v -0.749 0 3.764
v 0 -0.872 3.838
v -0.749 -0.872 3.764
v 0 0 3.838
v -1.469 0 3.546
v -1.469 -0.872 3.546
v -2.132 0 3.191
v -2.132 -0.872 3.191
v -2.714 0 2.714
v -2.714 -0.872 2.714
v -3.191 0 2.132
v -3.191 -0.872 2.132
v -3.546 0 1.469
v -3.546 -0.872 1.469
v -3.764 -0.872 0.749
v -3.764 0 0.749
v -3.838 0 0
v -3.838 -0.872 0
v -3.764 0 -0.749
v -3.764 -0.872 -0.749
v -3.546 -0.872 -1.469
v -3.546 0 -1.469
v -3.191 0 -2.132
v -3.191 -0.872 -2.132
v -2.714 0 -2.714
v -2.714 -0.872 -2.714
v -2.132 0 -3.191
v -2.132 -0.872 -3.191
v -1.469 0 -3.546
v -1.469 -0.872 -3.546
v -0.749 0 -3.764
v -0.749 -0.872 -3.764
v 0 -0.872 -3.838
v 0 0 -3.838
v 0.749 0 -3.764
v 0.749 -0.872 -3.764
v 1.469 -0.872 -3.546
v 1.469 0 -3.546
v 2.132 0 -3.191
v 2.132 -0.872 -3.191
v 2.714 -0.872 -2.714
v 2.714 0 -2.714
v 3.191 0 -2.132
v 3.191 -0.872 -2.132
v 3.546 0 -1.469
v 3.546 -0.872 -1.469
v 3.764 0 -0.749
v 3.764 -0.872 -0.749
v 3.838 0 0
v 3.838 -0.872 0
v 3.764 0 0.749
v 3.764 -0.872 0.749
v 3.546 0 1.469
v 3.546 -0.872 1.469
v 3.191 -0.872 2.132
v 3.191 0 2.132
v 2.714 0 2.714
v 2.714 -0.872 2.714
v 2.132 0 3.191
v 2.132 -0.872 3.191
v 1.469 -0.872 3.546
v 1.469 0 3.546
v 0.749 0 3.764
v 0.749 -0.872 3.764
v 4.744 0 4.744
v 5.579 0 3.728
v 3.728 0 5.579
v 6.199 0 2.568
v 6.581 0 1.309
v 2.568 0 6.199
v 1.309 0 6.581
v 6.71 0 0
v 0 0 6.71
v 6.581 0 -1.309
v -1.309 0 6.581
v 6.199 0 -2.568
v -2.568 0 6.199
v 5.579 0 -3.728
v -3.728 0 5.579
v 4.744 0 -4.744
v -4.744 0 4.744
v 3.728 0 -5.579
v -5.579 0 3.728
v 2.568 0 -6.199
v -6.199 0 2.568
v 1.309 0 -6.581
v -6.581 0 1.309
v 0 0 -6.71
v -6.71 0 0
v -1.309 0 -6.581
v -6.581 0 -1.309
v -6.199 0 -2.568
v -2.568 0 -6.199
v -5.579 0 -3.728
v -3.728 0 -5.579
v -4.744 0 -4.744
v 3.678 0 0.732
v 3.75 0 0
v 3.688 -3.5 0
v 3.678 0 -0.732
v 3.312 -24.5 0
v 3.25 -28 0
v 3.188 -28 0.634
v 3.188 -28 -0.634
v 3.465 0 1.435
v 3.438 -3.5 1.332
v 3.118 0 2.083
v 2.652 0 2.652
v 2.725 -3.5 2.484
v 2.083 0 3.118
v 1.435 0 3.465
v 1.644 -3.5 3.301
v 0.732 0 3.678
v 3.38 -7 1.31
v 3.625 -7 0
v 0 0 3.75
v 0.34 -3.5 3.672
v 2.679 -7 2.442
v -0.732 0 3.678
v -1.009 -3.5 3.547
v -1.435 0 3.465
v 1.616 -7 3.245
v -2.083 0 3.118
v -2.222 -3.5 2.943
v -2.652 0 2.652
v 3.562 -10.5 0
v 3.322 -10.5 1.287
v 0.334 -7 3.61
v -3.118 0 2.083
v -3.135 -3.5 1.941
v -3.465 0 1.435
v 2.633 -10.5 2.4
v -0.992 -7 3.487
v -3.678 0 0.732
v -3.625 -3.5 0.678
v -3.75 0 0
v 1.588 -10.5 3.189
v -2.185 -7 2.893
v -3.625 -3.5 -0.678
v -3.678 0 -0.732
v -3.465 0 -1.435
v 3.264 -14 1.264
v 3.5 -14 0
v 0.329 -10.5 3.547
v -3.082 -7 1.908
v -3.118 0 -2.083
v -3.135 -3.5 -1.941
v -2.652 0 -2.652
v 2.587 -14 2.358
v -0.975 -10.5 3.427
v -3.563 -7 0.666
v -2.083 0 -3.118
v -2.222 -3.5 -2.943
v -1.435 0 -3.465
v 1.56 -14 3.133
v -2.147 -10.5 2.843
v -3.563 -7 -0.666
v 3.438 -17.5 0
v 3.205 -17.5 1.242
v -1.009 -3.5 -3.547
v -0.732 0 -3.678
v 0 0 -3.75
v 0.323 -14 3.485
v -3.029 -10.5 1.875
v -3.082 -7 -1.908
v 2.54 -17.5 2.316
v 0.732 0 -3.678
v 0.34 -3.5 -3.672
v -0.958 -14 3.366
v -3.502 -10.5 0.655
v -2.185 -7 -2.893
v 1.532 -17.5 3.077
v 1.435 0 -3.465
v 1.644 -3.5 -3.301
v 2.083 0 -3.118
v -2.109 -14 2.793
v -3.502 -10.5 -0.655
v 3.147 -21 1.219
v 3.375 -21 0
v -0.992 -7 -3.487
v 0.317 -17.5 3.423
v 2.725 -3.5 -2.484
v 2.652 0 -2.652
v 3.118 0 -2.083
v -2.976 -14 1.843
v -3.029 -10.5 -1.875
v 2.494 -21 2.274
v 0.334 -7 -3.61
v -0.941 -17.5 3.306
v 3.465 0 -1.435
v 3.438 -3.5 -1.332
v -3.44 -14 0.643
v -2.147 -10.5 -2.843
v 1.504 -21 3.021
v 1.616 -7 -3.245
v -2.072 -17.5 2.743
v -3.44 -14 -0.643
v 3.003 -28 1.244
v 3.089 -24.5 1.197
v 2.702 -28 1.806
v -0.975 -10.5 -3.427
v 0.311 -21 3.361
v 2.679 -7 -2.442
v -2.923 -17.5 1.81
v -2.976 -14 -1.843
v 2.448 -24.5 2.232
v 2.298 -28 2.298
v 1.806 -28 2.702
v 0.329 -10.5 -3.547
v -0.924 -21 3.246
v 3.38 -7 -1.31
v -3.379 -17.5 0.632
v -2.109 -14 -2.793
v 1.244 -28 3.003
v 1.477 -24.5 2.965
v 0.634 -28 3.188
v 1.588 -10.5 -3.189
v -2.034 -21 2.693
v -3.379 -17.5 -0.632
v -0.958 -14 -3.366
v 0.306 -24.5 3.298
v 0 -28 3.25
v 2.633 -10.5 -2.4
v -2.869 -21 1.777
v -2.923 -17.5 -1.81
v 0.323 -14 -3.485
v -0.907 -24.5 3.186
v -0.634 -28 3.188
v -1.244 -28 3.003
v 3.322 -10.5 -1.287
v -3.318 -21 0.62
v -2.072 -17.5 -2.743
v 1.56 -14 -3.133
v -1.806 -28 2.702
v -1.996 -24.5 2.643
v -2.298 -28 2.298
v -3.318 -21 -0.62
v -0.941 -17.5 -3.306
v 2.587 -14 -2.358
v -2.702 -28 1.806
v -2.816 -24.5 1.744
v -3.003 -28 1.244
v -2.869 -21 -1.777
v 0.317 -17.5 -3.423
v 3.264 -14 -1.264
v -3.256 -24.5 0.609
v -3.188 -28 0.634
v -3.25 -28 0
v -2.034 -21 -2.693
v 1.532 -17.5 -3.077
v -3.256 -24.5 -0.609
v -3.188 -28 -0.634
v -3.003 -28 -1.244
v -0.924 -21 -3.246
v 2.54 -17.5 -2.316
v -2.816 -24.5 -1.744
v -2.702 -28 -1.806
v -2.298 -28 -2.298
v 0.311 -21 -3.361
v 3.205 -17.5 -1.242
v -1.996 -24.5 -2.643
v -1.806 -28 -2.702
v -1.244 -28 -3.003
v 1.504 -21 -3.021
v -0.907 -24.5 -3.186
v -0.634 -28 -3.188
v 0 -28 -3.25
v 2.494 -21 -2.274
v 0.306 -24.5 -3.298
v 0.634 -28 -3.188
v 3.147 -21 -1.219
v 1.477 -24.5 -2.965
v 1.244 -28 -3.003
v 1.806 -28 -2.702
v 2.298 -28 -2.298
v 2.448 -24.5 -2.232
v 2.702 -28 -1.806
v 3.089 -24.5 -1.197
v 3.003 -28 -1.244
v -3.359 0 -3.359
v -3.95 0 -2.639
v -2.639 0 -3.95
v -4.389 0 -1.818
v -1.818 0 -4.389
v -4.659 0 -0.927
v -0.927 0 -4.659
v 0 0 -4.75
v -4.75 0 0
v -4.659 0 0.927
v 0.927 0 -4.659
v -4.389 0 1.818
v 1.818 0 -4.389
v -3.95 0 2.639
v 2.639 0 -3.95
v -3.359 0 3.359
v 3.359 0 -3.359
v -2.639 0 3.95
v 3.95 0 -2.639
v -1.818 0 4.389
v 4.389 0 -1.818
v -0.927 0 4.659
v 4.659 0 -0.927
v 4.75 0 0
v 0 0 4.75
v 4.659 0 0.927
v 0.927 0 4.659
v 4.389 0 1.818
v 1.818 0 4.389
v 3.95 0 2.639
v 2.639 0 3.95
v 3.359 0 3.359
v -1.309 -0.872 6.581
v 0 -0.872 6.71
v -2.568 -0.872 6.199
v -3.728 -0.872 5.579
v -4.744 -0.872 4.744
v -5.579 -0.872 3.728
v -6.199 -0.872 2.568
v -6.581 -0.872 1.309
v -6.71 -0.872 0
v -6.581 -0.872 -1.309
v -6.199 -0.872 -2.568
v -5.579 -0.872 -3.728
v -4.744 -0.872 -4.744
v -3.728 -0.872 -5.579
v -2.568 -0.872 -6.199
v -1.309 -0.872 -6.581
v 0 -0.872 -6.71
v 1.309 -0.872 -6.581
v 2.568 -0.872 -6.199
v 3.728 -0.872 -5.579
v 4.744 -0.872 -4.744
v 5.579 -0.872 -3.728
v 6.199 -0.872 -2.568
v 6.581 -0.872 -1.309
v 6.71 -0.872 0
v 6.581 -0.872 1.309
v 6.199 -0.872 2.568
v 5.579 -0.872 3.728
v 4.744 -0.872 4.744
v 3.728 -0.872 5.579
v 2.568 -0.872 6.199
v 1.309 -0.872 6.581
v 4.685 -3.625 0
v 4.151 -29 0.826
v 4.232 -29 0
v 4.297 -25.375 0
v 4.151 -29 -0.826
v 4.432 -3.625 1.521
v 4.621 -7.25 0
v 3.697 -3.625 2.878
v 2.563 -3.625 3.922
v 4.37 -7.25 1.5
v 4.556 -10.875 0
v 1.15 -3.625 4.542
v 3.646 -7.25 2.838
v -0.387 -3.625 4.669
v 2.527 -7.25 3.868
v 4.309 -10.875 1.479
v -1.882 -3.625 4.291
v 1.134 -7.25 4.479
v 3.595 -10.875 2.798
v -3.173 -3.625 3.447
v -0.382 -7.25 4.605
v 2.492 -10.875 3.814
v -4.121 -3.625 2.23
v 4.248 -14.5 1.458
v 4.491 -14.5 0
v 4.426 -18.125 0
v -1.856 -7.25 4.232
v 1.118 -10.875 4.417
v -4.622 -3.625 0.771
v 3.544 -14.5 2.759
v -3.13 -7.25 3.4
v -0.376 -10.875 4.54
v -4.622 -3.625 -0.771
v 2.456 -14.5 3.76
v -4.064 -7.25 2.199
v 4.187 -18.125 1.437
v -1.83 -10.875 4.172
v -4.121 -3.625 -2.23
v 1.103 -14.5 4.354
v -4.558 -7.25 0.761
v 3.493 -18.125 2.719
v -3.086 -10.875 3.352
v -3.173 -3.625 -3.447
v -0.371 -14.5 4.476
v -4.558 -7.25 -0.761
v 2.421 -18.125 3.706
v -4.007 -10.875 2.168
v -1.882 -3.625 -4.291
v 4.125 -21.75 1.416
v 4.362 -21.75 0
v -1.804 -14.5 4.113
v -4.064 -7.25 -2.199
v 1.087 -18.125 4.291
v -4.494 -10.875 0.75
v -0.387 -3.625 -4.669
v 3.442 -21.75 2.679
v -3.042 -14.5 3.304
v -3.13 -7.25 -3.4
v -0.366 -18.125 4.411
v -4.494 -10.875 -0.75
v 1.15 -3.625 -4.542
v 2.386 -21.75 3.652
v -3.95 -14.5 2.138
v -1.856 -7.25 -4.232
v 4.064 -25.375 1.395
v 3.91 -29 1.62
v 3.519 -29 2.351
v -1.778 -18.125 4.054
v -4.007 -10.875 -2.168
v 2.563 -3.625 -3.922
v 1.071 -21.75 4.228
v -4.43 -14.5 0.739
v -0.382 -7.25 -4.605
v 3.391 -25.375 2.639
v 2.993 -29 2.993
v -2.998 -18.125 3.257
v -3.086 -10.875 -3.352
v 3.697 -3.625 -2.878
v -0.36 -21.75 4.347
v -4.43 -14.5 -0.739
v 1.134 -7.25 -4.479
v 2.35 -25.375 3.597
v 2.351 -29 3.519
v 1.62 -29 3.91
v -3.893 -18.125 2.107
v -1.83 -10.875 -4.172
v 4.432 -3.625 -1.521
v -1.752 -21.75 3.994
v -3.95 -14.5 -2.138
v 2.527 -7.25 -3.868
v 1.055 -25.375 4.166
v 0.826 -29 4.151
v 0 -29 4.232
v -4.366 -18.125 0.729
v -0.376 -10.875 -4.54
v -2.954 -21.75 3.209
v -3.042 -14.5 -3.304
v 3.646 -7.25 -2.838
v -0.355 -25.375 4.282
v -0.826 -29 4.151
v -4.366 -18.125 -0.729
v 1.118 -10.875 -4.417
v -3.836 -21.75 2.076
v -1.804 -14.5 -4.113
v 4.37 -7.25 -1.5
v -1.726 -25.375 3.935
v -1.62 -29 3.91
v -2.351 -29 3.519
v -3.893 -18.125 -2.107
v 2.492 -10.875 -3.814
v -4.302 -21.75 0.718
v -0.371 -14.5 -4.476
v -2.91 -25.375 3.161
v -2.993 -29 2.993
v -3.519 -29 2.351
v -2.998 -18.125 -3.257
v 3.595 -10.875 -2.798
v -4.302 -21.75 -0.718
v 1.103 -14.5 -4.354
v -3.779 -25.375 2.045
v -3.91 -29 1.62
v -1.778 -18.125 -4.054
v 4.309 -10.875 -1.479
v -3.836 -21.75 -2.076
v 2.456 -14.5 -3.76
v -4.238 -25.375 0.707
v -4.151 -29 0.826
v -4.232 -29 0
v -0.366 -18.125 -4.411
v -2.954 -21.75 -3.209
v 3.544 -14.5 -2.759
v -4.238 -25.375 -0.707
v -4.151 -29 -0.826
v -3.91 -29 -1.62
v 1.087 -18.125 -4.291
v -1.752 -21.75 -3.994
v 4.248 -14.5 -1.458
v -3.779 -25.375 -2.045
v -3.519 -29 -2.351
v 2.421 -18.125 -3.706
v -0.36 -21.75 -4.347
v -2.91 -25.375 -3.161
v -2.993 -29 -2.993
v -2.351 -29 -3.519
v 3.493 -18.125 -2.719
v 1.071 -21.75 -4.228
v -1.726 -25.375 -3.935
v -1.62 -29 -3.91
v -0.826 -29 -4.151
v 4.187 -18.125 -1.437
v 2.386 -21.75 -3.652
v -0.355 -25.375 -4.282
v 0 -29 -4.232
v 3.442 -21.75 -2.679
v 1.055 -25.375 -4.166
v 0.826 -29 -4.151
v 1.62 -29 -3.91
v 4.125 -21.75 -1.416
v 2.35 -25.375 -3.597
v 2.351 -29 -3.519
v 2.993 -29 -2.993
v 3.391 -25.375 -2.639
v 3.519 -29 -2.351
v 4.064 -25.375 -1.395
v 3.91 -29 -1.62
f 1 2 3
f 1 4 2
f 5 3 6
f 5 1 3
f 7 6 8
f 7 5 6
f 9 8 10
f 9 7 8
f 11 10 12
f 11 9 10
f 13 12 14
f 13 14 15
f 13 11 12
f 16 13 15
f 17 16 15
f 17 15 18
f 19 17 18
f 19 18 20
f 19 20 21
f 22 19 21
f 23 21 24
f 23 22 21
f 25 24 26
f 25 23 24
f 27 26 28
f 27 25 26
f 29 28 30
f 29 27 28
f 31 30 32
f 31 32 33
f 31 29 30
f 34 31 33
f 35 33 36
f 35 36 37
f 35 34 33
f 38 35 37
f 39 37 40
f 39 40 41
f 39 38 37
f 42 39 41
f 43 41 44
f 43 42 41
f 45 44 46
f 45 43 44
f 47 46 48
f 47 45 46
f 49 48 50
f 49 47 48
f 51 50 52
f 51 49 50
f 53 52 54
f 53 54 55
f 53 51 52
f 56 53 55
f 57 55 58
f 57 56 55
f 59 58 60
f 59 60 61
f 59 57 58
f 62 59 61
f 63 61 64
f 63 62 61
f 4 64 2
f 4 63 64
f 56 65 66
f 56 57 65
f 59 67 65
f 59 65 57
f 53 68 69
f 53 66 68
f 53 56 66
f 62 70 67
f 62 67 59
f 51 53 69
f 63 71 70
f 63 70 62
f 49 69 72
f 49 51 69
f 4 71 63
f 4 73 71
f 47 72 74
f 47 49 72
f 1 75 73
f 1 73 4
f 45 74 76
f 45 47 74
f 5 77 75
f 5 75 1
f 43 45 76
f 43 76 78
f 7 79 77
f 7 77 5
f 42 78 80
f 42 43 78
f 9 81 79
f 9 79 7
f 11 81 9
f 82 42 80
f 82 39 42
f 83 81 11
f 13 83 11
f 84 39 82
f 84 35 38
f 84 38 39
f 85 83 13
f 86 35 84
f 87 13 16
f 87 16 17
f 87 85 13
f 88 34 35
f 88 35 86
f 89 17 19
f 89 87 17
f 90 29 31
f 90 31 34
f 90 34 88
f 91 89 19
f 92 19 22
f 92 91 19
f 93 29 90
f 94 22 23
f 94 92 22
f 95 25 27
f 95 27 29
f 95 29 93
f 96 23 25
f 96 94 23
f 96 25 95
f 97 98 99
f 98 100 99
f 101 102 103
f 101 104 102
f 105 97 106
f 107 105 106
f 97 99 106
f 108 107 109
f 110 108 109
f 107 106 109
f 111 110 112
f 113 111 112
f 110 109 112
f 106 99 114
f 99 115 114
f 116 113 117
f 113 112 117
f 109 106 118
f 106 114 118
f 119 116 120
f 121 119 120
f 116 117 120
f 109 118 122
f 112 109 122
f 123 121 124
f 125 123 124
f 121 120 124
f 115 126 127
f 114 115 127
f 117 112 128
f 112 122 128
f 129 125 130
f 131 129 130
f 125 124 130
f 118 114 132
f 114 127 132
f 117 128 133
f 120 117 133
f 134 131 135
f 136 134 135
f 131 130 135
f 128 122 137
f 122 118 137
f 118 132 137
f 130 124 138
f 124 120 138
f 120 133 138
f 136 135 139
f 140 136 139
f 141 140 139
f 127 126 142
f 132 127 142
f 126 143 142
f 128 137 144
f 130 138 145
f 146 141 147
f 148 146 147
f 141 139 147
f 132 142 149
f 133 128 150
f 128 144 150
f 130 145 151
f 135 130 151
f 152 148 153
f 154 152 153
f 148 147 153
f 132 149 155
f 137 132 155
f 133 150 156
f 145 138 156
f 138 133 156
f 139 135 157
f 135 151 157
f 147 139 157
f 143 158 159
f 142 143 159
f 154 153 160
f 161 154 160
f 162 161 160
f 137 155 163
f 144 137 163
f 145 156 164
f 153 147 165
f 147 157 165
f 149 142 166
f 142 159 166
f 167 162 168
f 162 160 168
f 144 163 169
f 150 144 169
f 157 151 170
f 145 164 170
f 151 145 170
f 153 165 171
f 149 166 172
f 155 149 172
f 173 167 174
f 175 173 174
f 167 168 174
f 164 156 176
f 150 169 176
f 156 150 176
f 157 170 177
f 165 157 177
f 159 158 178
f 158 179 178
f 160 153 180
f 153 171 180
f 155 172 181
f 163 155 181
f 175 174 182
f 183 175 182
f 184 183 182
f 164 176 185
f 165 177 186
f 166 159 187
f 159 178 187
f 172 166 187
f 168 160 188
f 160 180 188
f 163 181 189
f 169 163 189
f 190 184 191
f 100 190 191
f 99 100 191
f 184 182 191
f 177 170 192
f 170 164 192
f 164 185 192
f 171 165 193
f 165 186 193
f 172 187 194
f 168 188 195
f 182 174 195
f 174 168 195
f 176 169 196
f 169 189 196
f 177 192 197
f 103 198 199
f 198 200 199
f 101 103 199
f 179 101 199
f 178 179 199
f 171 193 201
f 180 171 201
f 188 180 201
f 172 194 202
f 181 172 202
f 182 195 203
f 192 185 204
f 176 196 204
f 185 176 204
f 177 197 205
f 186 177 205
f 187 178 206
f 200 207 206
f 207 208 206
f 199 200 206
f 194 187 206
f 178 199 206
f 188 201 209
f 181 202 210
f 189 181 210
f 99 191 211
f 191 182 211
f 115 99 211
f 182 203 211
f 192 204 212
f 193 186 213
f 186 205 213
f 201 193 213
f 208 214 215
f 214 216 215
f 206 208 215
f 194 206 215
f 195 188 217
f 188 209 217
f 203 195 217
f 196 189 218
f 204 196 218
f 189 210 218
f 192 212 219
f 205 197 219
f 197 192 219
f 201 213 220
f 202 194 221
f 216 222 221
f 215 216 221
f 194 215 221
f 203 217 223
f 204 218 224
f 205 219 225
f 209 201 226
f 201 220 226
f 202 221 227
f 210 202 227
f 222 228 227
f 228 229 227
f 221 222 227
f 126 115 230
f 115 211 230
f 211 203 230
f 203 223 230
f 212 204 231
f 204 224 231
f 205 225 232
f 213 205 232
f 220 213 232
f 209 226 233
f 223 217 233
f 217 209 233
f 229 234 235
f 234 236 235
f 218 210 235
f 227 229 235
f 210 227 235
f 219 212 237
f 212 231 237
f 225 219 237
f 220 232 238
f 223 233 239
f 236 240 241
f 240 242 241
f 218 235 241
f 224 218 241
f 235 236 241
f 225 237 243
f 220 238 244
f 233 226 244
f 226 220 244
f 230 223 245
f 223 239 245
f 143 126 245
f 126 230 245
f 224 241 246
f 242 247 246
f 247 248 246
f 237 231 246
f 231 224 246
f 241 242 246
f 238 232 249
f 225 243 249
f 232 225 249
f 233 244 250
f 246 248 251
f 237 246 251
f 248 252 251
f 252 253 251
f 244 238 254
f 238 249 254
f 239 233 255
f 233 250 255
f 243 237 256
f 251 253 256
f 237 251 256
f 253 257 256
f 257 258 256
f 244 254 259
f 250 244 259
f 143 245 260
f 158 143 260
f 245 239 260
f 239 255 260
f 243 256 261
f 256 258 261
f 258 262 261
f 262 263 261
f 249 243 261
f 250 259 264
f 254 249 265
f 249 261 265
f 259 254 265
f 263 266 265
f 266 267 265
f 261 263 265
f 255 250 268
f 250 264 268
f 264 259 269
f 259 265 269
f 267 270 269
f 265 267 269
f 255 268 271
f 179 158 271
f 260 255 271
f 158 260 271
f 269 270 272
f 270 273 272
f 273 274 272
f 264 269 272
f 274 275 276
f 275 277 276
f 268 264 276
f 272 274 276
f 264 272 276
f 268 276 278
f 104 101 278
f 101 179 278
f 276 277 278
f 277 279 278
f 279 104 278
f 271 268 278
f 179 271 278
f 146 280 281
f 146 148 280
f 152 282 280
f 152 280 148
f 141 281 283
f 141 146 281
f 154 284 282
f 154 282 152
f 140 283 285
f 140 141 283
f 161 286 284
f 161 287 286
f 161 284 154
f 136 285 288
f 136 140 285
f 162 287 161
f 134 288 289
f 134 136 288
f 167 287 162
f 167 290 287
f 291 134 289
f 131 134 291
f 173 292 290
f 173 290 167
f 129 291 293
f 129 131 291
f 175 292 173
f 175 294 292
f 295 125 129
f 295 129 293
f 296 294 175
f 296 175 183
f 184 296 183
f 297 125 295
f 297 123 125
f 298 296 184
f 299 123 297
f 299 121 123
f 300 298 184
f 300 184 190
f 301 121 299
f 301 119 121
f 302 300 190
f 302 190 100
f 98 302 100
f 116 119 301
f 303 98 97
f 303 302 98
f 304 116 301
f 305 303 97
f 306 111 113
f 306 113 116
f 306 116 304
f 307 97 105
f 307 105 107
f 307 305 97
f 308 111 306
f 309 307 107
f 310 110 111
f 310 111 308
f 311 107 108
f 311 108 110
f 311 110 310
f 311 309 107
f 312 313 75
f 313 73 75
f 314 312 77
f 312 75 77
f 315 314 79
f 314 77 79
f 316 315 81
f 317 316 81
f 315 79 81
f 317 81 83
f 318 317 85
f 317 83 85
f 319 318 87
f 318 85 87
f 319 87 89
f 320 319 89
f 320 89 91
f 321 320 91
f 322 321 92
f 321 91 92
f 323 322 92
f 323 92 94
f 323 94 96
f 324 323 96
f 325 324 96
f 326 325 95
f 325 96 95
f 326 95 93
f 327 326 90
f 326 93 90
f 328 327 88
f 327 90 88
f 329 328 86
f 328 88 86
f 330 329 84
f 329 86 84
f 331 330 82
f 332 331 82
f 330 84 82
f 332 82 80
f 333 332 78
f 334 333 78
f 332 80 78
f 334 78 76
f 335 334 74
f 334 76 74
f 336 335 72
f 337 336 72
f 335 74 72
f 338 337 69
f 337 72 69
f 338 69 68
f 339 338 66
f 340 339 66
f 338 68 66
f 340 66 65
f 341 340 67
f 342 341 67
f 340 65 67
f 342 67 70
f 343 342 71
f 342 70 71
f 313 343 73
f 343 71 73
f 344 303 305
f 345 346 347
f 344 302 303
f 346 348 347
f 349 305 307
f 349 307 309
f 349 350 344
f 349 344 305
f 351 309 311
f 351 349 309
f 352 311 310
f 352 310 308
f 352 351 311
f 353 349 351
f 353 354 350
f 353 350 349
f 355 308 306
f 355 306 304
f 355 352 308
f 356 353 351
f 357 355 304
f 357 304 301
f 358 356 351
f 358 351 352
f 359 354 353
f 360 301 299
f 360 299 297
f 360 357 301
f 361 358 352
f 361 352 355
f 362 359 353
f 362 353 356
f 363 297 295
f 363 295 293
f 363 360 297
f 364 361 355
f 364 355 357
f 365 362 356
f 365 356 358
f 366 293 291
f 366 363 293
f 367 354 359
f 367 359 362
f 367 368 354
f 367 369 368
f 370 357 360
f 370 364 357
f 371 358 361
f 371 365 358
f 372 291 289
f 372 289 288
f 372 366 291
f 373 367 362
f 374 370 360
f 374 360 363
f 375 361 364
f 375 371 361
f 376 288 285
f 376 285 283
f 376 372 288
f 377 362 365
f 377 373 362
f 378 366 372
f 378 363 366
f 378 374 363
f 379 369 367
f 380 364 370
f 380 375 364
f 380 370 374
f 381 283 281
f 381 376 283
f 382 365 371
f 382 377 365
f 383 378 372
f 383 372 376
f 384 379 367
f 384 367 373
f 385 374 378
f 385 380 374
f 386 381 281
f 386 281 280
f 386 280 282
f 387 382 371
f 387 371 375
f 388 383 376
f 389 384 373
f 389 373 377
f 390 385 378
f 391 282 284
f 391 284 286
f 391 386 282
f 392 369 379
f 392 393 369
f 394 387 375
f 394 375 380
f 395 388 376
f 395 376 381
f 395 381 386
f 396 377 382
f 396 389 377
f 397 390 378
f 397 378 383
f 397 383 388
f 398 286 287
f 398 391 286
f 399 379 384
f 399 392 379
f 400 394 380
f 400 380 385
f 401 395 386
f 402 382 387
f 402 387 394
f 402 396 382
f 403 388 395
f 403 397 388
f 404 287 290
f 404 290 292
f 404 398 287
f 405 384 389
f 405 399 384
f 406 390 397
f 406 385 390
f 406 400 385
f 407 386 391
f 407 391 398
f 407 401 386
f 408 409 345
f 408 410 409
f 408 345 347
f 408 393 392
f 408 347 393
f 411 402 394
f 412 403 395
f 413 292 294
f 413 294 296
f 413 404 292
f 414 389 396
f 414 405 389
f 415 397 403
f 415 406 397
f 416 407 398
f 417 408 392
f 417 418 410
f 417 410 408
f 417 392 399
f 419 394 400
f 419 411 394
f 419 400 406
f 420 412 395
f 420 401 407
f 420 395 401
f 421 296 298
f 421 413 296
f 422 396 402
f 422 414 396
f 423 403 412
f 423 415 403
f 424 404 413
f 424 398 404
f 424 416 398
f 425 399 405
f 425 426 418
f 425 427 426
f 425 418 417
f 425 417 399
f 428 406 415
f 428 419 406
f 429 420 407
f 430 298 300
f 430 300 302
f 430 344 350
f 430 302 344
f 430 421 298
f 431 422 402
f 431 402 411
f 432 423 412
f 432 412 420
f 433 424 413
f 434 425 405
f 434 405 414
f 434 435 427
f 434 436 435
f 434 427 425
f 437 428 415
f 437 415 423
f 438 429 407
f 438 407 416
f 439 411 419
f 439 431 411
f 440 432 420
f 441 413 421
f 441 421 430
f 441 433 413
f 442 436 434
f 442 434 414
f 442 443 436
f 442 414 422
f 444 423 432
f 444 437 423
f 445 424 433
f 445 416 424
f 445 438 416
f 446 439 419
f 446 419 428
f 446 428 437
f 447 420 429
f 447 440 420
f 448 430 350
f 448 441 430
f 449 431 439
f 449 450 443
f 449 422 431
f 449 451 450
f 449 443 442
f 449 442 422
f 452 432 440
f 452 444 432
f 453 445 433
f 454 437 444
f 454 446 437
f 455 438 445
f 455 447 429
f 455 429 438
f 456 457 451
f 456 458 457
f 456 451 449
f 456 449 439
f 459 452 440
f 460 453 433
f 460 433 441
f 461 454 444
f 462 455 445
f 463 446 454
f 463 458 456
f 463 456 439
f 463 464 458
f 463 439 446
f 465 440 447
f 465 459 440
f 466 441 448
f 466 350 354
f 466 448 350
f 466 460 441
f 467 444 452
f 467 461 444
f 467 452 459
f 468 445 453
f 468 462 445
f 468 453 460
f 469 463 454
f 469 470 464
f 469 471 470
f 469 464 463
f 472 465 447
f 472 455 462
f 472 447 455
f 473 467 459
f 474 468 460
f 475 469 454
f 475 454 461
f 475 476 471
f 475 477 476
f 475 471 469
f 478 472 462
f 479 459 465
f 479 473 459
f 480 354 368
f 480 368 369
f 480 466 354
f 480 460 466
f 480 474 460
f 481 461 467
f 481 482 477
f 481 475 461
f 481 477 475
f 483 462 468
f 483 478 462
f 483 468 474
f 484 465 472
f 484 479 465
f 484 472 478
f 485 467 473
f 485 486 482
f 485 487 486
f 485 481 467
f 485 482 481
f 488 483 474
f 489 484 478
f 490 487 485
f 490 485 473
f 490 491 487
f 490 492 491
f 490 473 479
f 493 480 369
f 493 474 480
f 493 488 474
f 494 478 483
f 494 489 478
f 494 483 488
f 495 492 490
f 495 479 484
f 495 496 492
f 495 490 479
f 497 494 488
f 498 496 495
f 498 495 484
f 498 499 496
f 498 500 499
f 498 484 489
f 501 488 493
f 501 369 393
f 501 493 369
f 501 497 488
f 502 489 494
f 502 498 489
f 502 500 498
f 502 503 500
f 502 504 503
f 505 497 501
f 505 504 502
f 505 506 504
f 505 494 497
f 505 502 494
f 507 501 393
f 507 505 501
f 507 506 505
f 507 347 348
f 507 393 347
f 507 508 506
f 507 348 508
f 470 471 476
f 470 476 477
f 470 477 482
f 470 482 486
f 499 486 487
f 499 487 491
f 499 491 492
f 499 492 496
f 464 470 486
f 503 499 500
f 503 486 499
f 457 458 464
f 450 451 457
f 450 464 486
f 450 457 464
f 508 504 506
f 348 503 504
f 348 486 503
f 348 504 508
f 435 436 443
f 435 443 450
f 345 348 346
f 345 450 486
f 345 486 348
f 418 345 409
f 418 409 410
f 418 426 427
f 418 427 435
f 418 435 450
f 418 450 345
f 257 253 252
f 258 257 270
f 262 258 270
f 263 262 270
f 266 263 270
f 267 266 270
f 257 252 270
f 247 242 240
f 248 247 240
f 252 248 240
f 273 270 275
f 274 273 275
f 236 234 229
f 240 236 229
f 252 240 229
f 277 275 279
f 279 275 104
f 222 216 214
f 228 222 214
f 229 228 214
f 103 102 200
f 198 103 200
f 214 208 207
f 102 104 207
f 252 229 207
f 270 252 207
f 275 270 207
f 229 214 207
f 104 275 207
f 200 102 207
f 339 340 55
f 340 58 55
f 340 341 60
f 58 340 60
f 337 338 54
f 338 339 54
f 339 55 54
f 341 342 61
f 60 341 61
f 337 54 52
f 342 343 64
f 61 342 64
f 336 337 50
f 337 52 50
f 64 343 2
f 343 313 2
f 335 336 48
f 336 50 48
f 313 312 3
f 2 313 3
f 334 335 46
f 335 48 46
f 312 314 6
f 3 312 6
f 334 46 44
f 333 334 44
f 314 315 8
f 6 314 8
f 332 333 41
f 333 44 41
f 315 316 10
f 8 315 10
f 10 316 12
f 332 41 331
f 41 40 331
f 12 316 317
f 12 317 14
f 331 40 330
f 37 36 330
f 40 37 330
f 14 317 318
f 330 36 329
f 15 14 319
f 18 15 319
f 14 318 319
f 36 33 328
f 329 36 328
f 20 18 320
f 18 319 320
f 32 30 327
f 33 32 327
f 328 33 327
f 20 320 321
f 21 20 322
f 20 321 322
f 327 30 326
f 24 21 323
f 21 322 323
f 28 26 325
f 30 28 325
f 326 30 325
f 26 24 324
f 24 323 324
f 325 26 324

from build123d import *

# Parameters (mm, degrees)
F0_R     = 3.75
F2_R     = 3.25
F4_W     = 0.8722444763
F4_H     = 2.8718363028
F6_T     = 1
F7_W     = 1.1980372947
F7_H     = 13.454537373
F8_DEPTH = 12.5


with BuildPart() as f3:
    # F0 (on Front) → F3 section 0
    with BuildSketch(Plane.XZ):
        Circle(F0_R)
    # F2 (on offset) → F3 section 1
    with BuildSketch(Plane.XZ.offset(28)):
        Circle(F2_R)
    loft()

    # F6 (hollow, outwards: the wall grows on the outside; the body as it was is the cavity)
    f6_inside = f3.part
    offset(amount=F6_T, kind=Kind.INTERSECTION)
    add(f6_inside, mode=Mode.SUBTRACT)

    # F7 (on Right) → F8 (cut, symmetric)
    with BuildSketch(Plane.YZ):
        with Locations((0.5990186473, -5.23869e-05)):
            Rectangle(F7_W, F7_H)
    extrude(amount=F8_DEPTH, both=True, mode=Mode.SUBTRACT)


with BuildPart() as f5:
    # F4 (on Right) → F5 (revolve)
    with BuildSketch(Plane.YZ):
        with Locations((-0.4361222382, 5.2737850929)):
            Rectangle(F4_W, F4_H)
    revolve(axis=Axis((0, 0, 0), (0, -1, 0)))


solid = Compound([f3.part, f5.part])
